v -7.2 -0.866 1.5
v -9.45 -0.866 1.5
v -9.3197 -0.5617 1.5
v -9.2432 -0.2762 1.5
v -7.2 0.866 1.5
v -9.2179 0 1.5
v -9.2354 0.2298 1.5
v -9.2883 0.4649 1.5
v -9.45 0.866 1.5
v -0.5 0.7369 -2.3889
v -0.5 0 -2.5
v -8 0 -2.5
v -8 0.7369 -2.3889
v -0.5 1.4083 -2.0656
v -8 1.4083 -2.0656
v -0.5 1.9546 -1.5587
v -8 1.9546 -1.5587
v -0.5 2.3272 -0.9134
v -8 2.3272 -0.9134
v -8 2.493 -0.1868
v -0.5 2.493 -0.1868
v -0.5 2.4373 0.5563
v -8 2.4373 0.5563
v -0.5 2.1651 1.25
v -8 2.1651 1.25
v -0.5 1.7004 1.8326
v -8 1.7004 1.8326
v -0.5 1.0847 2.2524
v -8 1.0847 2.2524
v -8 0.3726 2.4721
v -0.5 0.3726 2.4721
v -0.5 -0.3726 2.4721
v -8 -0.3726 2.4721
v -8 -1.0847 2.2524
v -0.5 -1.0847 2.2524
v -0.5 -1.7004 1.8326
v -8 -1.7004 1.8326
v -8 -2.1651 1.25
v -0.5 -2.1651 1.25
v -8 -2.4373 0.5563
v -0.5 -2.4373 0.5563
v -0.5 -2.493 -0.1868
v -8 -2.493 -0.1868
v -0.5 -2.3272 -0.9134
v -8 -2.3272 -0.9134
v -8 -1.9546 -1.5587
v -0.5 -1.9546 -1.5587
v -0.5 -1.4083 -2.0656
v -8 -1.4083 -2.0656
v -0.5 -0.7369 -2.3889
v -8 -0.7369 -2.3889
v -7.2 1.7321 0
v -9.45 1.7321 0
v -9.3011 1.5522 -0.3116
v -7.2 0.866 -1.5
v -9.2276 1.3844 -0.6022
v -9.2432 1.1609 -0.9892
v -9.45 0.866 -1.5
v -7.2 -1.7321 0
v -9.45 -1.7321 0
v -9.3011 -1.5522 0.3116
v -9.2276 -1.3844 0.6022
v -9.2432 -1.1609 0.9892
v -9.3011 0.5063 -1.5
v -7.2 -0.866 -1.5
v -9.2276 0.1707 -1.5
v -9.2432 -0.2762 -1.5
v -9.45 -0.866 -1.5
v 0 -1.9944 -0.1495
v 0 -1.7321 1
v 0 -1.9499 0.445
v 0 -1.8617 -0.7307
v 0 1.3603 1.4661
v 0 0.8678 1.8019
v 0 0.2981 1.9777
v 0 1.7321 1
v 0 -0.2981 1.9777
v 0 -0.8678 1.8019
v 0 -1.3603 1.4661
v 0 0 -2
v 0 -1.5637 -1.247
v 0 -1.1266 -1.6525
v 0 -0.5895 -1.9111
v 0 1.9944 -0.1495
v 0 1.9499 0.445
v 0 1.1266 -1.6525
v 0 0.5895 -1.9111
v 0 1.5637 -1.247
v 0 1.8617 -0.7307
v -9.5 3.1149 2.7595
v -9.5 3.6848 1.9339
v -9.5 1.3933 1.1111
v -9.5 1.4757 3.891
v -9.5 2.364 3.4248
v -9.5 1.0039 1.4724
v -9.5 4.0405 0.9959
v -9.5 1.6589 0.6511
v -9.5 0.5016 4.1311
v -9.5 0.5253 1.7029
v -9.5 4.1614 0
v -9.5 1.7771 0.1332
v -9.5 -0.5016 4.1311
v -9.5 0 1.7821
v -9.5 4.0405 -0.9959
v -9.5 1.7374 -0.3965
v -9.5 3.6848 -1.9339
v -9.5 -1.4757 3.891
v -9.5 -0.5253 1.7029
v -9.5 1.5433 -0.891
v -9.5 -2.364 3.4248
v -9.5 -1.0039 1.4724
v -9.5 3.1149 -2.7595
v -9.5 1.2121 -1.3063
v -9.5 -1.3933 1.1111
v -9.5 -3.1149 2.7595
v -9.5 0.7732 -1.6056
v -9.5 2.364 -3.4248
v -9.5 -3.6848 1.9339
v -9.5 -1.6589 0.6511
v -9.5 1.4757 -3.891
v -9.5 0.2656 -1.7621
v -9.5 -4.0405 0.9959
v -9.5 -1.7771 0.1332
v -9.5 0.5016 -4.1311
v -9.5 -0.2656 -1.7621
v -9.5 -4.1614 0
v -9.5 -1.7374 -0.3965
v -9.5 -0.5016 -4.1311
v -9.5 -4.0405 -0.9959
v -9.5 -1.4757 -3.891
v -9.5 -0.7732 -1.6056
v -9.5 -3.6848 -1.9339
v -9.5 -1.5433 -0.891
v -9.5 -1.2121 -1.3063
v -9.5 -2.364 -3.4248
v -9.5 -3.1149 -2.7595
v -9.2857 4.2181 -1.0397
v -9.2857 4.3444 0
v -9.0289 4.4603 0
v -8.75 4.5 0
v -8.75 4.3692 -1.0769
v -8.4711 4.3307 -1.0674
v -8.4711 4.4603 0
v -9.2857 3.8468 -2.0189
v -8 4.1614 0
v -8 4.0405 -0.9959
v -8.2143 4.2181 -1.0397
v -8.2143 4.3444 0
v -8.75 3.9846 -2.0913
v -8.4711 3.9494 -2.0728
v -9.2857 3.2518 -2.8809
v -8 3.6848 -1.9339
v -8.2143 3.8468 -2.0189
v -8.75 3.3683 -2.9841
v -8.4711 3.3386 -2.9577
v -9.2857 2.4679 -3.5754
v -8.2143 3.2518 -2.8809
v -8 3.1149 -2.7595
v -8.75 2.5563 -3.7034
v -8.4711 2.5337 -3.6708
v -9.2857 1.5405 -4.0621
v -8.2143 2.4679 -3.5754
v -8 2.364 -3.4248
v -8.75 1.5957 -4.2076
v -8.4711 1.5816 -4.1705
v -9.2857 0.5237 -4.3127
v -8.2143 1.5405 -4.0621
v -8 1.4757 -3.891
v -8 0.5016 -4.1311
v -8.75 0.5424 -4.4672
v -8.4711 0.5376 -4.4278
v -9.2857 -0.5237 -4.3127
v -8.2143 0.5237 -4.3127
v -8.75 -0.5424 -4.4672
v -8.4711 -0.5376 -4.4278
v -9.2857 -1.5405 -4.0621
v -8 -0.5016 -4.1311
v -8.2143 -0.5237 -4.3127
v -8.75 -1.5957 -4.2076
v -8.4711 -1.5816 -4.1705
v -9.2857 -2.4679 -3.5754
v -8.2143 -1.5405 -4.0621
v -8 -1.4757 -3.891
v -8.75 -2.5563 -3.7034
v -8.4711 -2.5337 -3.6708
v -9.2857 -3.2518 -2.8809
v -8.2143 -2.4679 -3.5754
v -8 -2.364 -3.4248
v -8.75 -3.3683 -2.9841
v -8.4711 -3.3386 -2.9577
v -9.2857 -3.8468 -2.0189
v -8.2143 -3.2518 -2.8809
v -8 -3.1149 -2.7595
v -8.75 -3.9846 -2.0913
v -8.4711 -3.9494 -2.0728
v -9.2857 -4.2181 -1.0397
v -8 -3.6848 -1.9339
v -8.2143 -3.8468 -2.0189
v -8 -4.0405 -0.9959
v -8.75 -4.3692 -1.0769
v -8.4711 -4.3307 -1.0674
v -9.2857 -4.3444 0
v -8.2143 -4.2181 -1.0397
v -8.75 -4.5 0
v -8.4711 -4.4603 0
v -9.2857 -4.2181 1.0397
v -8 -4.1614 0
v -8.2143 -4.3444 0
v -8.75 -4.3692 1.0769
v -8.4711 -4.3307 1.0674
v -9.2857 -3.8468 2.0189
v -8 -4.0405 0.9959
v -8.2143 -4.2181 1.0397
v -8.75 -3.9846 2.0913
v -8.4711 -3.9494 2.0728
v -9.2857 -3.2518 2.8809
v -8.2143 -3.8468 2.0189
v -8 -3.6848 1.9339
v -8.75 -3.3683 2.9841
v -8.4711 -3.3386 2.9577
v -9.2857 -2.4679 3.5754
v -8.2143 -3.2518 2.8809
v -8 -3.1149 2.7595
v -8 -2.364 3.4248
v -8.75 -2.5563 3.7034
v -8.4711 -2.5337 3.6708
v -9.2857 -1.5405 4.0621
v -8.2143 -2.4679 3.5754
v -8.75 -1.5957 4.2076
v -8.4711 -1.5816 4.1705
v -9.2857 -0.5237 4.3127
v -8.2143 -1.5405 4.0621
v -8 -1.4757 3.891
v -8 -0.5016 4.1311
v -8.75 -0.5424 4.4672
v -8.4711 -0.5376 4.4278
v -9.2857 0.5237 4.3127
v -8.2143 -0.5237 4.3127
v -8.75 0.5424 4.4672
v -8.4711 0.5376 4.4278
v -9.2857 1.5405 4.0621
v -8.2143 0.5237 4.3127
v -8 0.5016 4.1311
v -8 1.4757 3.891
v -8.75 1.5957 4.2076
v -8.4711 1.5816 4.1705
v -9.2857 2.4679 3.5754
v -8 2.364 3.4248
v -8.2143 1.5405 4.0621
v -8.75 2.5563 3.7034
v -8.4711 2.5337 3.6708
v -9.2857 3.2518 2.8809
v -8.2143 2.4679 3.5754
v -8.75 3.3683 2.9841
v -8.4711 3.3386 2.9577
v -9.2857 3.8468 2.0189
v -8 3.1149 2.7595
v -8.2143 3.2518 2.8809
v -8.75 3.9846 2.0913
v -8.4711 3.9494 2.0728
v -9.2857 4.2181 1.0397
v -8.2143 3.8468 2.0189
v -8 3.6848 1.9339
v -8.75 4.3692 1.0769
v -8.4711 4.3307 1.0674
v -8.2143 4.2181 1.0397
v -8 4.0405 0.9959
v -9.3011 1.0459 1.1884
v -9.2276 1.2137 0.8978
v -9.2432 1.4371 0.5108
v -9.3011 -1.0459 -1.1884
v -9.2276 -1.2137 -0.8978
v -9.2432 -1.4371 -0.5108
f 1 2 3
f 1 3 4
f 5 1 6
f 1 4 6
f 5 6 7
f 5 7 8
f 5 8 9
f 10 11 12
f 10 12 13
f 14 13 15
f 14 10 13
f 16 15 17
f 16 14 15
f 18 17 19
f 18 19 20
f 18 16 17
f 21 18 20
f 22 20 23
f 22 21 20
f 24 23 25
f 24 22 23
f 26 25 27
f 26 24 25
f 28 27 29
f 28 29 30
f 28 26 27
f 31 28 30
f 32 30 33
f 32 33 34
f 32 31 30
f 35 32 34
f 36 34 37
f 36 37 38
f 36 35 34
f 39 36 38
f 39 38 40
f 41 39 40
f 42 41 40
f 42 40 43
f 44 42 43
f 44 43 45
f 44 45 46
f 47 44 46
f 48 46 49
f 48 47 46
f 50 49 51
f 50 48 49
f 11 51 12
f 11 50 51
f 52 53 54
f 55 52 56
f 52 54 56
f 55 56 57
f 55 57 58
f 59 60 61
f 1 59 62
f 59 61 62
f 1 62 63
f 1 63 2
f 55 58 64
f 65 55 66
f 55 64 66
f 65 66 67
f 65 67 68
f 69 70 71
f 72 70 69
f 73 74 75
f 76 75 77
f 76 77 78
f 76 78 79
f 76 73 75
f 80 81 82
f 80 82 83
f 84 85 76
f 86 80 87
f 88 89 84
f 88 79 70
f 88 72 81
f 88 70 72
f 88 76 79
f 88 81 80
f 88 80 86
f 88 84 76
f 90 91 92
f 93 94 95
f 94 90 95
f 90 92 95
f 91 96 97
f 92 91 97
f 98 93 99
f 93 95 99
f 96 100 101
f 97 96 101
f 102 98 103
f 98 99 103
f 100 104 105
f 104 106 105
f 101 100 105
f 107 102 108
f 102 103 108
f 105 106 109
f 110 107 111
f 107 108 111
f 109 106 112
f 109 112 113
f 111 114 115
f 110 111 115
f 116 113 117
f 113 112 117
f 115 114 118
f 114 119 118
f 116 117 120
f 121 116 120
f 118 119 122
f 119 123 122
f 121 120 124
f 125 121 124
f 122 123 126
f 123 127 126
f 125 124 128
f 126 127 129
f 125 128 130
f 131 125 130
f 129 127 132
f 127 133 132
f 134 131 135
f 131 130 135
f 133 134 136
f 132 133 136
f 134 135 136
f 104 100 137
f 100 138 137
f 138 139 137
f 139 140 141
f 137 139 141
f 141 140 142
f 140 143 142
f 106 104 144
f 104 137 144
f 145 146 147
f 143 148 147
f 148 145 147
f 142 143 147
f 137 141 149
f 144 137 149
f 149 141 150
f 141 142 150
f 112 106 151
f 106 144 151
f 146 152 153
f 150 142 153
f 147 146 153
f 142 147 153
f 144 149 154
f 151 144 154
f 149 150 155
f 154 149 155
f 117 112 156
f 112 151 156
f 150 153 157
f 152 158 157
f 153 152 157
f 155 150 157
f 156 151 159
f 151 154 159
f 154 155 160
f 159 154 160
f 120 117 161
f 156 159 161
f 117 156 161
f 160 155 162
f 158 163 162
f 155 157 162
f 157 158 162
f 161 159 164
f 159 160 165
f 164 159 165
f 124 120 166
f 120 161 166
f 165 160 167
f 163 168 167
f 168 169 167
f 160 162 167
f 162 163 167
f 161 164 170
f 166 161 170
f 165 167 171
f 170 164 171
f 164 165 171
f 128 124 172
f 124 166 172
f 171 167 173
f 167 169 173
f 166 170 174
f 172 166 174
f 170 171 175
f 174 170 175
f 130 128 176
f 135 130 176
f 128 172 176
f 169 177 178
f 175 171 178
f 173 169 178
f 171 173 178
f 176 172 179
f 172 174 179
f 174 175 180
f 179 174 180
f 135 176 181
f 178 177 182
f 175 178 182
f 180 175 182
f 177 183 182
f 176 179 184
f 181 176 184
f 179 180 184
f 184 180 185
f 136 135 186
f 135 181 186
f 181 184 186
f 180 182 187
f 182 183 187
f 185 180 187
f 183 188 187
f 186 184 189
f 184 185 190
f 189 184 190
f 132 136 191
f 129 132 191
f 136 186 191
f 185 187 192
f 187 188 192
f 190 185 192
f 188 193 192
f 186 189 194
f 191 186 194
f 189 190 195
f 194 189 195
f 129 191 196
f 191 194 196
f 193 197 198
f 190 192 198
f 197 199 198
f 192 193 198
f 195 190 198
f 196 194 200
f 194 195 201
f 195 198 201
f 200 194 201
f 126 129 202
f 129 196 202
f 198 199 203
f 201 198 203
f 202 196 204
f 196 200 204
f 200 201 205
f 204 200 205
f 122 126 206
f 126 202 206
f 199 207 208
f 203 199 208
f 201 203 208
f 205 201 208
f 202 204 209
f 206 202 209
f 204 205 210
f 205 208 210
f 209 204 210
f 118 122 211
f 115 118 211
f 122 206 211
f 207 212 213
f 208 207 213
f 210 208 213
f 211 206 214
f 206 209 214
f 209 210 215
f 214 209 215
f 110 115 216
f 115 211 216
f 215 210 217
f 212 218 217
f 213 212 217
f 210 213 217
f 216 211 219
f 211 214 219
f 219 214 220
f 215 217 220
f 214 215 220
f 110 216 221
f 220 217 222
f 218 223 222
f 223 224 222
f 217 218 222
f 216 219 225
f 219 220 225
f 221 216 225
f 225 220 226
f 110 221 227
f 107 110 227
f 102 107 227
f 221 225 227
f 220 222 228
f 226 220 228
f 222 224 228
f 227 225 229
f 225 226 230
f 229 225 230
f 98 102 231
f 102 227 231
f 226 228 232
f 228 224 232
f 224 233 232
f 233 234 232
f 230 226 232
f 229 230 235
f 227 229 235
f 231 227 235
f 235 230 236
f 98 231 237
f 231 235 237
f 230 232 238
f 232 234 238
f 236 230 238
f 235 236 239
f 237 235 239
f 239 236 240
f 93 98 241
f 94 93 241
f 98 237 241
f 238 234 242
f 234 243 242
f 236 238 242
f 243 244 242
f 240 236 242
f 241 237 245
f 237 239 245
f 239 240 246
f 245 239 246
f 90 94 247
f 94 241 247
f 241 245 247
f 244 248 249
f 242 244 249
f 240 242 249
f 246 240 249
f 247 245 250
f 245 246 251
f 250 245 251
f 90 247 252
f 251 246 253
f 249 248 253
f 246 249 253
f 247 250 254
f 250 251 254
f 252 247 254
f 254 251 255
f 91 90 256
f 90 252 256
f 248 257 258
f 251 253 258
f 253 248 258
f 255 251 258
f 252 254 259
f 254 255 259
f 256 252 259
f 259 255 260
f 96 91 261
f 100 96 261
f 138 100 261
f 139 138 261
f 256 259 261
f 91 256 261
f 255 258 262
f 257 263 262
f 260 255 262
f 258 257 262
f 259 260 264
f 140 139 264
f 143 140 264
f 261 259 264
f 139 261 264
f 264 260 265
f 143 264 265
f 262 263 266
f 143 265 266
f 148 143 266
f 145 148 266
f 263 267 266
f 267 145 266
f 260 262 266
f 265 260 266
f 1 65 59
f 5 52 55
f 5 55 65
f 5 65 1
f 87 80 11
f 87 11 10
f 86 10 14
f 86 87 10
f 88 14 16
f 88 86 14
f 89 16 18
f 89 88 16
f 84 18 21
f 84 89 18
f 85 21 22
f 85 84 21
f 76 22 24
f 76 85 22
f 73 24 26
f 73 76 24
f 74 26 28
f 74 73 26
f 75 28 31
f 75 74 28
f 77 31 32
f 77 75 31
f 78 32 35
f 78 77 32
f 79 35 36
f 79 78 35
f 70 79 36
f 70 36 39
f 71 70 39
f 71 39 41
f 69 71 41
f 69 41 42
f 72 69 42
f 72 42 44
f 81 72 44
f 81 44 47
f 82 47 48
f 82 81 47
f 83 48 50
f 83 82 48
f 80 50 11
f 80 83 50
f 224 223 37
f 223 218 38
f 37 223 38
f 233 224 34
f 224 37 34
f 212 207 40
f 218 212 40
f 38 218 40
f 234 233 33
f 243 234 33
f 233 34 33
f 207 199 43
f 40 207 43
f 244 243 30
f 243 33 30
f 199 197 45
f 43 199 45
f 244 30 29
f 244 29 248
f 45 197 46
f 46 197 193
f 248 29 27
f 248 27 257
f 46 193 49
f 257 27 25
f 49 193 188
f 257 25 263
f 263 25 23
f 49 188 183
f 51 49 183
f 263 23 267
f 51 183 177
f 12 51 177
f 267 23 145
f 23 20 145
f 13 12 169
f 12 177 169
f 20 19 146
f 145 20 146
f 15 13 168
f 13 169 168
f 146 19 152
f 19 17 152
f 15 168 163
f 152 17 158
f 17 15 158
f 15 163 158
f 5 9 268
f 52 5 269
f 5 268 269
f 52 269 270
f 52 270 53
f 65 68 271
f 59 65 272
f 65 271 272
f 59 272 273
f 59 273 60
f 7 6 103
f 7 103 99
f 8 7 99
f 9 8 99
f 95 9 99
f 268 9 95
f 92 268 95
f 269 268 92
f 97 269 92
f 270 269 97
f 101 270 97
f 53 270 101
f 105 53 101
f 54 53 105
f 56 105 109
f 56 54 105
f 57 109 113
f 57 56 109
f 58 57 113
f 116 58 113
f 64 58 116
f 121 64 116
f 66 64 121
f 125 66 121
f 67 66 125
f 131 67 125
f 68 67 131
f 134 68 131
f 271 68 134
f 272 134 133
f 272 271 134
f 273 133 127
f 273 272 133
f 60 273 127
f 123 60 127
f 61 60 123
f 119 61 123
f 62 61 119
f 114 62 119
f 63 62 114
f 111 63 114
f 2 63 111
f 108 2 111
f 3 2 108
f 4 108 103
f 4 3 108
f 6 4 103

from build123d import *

# Parameters (mm, degrees)
SKETCH2_R           = 2.5
BOSS_EXTRUDE1_DEPTH = 8
CHAMFER1_SIZE       = 0.5
CUT_EXTRUDE1_DEPTH  = 2.3
SKETCH8_R           = 1.782050808
CUT_EXTRUDE2_DEPTH  = 1
CUT_EXTRUDE2_TAPER  = 45


with BuildPart() as part:
    # Sketch2 → Boss-Extrude1 (new body)
    with BuildSketch(Plane(origin=(0, 0, 0), x_dir=(0, 0, -1), z_dir=(1, 0, 0))):
        Circle(SKETCH2_R)
    extrude(amount=-BOSS_EXTRUDE1_DEPTH)

    # Chamfer1
    chamfer1_edges = [part.edges().sort_by_distance(p)[0] for p in [
        (0, 0, 2.5),
    ]]
    chamfer(chamfer1_edges, length=CHAMFER1_SIZE)

    # Sketch6 → Revolve1 (revolve)
    with BuildSketch(Plane.XY):
        with BuildLine():
            Line((-9.5, 0), (-9.5, 4.161437828))
            ThreePointArc((-9.5, 4.161437828), (-8.75, 4.5), (-8, 4.161437828))
            Line((-8, 4.161437828), (-8, 0))
            Line((-8, 0), (-9.5, 0))
        make_face()
    revolve(axis=Axis((-8, 0, 0), (-1, 0, 0)))

    # Sketch7 → Cut-Extrude1 (cut)
    with BuildSketch(Plane.ZY.offset(9.5)):
        Polygon((0, 1.732050808), (-1.5, 0.866025404), (-1.5, -0.866025404), (0, -1.732050808), (1.5, -0.866025404), (1.5, 0.866025404), align=None)
    extrude(amount=-CUT_EXTRUDE1_DEPTH, mode=Mode.SUBTRACT)

    # Sketch8 → Cut-Extrude2 (cut)
    with BuildSketch(Plane.ZY.offset(9.5)):
        Circle(SKETCH8_R)
    extrude(amount=-CUT_EXTRUDE2_DEPTH, taper=CUT_EXTRUDE2_TAPER, mode=Mode.SUBTRACT)


solid = part.part
